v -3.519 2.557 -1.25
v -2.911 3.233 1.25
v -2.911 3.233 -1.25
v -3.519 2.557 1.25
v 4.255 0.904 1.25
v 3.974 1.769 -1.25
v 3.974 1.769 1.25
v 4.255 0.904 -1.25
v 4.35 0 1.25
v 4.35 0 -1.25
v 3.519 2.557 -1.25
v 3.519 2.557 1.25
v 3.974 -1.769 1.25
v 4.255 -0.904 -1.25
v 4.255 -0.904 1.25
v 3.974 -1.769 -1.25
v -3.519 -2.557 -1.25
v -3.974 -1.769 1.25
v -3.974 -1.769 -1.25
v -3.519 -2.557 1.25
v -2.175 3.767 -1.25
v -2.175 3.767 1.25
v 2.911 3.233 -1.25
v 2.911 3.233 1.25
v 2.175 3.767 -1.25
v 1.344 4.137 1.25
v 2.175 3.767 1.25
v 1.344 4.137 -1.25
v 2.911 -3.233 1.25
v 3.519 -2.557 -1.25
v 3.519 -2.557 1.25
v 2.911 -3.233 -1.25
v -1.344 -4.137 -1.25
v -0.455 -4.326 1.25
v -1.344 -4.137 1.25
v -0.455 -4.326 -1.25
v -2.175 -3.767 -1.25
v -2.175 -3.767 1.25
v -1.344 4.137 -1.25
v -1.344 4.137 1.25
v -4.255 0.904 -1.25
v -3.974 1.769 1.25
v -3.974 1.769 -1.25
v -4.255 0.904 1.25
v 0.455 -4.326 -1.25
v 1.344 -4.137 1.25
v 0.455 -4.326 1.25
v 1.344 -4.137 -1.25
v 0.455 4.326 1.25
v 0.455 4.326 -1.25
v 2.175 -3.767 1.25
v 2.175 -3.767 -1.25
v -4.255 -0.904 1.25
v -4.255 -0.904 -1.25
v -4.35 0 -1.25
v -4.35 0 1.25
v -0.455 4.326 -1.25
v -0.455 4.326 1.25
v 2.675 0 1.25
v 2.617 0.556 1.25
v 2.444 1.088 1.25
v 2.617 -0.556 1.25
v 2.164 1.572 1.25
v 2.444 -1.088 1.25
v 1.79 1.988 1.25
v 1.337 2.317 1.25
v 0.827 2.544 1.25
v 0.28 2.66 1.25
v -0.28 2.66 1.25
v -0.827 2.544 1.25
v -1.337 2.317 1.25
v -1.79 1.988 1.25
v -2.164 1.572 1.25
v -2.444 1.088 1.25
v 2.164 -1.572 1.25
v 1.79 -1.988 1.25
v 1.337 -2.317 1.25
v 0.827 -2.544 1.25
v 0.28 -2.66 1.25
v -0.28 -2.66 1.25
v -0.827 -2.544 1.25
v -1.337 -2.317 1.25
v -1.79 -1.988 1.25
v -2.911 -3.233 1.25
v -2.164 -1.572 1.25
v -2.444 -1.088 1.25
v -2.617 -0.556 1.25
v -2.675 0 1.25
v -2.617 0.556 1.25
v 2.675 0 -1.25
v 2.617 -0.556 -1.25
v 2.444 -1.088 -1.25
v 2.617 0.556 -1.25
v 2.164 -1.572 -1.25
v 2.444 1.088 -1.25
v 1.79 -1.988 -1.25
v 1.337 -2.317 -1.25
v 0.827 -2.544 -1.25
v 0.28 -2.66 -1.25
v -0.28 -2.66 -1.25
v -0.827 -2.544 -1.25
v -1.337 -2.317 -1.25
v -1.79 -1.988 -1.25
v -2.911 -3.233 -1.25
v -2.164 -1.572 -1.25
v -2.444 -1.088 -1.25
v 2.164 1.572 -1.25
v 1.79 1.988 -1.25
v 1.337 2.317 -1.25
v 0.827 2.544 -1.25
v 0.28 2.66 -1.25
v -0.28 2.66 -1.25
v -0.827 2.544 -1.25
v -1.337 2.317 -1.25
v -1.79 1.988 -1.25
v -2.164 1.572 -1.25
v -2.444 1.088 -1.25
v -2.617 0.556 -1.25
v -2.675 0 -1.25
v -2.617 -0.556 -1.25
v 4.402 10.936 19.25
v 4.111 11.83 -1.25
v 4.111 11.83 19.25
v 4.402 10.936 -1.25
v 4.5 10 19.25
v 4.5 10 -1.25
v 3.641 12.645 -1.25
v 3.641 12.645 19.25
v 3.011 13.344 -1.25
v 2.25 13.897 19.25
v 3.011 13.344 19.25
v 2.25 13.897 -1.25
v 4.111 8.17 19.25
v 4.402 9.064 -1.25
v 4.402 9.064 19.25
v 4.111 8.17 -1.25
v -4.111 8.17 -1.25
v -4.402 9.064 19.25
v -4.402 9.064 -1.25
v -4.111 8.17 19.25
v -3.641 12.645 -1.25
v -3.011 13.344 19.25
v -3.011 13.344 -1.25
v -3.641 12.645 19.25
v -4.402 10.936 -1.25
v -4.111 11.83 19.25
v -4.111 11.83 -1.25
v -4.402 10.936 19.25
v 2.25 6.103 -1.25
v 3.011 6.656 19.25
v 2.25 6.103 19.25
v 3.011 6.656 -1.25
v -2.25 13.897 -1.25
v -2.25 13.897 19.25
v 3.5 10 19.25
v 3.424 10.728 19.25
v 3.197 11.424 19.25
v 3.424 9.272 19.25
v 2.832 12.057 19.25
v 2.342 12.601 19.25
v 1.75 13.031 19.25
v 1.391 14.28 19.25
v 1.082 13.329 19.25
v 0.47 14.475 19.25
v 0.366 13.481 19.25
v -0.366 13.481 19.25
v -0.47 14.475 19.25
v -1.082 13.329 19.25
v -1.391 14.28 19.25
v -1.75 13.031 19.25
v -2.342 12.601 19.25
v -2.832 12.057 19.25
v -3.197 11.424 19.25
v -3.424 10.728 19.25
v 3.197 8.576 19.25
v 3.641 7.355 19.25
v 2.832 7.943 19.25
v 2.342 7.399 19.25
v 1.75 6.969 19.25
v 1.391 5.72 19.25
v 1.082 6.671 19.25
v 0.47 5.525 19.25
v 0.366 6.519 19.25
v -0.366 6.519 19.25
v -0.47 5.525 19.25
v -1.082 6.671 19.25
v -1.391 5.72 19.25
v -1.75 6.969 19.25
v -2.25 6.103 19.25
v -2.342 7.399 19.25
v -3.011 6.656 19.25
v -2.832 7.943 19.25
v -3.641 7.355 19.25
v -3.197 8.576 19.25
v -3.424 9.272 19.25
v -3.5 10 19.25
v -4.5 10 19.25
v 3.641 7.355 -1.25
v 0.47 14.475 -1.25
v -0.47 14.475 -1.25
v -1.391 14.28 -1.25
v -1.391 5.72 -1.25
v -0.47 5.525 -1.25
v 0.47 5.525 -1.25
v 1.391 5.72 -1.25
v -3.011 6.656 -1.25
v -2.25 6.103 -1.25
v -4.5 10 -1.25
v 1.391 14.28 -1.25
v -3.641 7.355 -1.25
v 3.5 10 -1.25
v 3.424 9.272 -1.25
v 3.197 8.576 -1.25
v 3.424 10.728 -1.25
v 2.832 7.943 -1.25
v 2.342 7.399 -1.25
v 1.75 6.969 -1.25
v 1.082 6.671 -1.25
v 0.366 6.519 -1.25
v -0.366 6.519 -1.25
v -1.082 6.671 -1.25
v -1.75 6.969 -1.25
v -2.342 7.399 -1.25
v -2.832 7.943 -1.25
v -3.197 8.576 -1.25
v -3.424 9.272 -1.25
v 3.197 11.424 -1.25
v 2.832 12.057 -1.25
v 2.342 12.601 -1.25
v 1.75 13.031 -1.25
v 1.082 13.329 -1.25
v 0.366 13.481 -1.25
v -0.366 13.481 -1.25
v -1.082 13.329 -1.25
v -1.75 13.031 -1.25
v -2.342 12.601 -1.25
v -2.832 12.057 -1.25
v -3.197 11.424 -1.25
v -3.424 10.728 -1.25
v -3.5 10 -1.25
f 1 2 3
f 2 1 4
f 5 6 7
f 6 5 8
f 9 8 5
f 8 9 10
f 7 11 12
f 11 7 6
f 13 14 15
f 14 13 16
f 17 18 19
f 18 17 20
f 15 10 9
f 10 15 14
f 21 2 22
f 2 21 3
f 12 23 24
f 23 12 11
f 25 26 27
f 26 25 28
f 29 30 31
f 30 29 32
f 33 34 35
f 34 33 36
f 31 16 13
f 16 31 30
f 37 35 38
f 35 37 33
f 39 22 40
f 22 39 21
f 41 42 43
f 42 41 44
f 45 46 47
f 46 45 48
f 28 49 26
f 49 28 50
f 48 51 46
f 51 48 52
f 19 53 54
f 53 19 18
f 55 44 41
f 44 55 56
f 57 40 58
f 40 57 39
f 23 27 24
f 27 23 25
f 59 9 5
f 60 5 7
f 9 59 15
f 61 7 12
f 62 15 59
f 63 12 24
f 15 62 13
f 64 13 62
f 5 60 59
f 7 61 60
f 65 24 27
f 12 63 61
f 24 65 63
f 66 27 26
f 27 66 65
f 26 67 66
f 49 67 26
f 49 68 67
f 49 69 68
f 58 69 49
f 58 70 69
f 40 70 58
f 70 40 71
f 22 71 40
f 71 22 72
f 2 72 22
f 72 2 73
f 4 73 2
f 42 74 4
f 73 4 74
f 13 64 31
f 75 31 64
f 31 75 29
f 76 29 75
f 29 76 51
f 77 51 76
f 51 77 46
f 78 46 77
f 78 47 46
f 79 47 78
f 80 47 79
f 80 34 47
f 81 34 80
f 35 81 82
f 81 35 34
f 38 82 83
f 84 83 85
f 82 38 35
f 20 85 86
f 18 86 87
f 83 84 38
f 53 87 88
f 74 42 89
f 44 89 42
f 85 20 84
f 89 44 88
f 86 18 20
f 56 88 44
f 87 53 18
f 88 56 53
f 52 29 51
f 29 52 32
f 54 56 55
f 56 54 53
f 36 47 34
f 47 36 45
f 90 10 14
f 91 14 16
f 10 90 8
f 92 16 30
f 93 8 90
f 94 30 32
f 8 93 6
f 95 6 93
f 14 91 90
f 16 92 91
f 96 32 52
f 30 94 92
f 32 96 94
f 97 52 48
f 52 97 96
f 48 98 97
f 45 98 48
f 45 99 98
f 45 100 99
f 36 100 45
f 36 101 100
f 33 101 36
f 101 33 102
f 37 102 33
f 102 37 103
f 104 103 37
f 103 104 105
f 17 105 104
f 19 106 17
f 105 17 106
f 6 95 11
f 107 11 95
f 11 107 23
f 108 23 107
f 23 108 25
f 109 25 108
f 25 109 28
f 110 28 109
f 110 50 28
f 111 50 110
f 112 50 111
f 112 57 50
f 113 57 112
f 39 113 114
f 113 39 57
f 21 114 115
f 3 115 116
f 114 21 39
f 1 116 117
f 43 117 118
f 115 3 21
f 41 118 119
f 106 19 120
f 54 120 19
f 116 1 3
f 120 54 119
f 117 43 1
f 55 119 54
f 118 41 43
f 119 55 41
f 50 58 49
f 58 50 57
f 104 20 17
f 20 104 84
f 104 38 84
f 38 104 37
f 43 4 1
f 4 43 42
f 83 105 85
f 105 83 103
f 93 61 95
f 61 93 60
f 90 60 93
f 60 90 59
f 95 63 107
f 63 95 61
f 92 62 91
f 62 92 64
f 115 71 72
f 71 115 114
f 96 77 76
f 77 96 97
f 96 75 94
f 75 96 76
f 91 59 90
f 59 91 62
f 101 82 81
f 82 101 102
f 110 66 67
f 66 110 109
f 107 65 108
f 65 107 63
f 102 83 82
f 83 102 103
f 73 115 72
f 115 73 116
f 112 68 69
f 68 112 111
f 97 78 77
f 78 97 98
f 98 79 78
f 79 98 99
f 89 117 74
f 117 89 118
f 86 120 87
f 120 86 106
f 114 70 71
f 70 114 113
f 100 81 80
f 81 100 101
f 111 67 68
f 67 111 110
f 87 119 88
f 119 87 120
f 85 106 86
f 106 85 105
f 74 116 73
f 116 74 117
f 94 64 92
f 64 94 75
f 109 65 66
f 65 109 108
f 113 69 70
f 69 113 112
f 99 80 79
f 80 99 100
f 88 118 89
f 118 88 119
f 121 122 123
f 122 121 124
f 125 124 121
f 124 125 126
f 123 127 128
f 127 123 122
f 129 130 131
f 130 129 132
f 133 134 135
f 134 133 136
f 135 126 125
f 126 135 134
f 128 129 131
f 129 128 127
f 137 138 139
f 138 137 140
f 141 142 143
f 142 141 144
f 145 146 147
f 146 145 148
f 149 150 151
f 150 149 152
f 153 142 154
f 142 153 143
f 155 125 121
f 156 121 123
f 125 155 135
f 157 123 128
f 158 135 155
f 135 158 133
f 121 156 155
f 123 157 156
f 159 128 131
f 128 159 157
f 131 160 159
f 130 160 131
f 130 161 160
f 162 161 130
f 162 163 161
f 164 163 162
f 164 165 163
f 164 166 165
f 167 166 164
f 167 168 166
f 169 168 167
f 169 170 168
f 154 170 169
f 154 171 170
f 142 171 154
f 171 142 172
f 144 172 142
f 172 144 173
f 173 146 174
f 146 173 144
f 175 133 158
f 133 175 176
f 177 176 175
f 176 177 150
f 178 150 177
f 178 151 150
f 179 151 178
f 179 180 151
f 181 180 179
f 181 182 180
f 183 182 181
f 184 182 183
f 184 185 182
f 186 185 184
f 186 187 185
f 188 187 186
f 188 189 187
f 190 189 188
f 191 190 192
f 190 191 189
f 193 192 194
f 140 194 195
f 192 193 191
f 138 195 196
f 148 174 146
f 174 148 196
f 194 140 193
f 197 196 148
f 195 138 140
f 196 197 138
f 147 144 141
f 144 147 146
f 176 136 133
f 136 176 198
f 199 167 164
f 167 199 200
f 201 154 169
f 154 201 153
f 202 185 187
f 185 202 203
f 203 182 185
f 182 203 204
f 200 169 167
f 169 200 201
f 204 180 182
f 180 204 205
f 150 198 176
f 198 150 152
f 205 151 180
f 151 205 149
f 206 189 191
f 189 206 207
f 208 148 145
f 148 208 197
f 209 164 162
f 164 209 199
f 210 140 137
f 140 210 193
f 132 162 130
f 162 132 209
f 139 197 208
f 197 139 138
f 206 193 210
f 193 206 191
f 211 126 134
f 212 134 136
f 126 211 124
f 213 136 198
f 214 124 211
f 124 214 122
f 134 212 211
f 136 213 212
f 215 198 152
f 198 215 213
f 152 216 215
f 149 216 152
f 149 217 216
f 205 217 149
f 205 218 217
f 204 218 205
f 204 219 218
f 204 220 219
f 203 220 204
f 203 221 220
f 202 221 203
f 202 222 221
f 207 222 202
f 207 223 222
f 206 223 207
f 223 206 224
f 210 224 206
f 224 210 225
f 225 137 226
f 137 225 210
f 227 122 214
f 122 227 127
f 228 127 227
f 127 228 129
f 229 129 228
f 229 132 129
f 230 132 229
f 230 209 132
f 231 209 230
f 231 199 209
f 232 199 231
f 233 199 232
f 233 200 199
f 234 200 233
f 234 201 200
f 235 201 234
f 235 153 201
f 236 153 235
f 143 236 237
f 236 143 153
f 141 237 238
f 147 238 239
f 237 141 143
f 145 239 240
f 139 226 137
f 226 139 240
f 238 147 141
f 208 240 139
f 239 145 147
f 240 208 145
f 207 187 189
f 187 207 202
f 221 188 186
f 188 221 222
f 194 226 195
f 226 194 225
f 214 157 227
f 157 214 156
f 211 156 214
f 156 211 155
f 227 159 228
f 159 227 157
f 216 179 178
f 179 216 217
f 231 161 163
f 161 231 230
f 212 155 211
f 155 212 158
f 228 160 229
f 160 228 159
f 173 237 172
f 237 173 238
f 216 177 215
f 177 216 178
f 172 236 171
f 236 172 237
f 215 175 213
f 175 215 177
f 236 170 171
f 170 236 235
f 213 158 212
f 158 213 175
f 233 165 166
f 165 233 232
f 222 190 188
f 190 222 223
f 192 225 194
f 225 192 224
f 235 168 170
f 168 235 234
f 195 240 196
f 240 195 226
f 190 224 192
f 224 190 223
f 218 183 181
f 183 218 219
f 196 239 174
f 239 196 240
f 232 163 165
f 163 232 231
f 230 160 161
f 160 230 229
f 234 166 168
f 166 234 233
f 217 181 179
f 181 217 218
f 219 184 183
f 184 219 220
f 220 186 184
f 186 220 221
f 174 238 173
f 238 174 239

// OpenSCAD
scale([.05,.05,.05]) {
    translate([0, 0, 0]) {
        difference() {
            cylinder(h = 50, r1 = 87, r2 = 87, center = true);
            cylinder(h = 51, r1 = 53.5, r2 = 53.5, center = true);
        }
    }
}
scale([.05,.05,.05]) {    
        translate([0, 200, 180]) {
        difference() {
            cylinder(h = 410, r1 = 90, r2 = 90, center = true);
            cylinder(h = 411, r1 = 70, r2 = 70, center = true);
        }
    }
}
